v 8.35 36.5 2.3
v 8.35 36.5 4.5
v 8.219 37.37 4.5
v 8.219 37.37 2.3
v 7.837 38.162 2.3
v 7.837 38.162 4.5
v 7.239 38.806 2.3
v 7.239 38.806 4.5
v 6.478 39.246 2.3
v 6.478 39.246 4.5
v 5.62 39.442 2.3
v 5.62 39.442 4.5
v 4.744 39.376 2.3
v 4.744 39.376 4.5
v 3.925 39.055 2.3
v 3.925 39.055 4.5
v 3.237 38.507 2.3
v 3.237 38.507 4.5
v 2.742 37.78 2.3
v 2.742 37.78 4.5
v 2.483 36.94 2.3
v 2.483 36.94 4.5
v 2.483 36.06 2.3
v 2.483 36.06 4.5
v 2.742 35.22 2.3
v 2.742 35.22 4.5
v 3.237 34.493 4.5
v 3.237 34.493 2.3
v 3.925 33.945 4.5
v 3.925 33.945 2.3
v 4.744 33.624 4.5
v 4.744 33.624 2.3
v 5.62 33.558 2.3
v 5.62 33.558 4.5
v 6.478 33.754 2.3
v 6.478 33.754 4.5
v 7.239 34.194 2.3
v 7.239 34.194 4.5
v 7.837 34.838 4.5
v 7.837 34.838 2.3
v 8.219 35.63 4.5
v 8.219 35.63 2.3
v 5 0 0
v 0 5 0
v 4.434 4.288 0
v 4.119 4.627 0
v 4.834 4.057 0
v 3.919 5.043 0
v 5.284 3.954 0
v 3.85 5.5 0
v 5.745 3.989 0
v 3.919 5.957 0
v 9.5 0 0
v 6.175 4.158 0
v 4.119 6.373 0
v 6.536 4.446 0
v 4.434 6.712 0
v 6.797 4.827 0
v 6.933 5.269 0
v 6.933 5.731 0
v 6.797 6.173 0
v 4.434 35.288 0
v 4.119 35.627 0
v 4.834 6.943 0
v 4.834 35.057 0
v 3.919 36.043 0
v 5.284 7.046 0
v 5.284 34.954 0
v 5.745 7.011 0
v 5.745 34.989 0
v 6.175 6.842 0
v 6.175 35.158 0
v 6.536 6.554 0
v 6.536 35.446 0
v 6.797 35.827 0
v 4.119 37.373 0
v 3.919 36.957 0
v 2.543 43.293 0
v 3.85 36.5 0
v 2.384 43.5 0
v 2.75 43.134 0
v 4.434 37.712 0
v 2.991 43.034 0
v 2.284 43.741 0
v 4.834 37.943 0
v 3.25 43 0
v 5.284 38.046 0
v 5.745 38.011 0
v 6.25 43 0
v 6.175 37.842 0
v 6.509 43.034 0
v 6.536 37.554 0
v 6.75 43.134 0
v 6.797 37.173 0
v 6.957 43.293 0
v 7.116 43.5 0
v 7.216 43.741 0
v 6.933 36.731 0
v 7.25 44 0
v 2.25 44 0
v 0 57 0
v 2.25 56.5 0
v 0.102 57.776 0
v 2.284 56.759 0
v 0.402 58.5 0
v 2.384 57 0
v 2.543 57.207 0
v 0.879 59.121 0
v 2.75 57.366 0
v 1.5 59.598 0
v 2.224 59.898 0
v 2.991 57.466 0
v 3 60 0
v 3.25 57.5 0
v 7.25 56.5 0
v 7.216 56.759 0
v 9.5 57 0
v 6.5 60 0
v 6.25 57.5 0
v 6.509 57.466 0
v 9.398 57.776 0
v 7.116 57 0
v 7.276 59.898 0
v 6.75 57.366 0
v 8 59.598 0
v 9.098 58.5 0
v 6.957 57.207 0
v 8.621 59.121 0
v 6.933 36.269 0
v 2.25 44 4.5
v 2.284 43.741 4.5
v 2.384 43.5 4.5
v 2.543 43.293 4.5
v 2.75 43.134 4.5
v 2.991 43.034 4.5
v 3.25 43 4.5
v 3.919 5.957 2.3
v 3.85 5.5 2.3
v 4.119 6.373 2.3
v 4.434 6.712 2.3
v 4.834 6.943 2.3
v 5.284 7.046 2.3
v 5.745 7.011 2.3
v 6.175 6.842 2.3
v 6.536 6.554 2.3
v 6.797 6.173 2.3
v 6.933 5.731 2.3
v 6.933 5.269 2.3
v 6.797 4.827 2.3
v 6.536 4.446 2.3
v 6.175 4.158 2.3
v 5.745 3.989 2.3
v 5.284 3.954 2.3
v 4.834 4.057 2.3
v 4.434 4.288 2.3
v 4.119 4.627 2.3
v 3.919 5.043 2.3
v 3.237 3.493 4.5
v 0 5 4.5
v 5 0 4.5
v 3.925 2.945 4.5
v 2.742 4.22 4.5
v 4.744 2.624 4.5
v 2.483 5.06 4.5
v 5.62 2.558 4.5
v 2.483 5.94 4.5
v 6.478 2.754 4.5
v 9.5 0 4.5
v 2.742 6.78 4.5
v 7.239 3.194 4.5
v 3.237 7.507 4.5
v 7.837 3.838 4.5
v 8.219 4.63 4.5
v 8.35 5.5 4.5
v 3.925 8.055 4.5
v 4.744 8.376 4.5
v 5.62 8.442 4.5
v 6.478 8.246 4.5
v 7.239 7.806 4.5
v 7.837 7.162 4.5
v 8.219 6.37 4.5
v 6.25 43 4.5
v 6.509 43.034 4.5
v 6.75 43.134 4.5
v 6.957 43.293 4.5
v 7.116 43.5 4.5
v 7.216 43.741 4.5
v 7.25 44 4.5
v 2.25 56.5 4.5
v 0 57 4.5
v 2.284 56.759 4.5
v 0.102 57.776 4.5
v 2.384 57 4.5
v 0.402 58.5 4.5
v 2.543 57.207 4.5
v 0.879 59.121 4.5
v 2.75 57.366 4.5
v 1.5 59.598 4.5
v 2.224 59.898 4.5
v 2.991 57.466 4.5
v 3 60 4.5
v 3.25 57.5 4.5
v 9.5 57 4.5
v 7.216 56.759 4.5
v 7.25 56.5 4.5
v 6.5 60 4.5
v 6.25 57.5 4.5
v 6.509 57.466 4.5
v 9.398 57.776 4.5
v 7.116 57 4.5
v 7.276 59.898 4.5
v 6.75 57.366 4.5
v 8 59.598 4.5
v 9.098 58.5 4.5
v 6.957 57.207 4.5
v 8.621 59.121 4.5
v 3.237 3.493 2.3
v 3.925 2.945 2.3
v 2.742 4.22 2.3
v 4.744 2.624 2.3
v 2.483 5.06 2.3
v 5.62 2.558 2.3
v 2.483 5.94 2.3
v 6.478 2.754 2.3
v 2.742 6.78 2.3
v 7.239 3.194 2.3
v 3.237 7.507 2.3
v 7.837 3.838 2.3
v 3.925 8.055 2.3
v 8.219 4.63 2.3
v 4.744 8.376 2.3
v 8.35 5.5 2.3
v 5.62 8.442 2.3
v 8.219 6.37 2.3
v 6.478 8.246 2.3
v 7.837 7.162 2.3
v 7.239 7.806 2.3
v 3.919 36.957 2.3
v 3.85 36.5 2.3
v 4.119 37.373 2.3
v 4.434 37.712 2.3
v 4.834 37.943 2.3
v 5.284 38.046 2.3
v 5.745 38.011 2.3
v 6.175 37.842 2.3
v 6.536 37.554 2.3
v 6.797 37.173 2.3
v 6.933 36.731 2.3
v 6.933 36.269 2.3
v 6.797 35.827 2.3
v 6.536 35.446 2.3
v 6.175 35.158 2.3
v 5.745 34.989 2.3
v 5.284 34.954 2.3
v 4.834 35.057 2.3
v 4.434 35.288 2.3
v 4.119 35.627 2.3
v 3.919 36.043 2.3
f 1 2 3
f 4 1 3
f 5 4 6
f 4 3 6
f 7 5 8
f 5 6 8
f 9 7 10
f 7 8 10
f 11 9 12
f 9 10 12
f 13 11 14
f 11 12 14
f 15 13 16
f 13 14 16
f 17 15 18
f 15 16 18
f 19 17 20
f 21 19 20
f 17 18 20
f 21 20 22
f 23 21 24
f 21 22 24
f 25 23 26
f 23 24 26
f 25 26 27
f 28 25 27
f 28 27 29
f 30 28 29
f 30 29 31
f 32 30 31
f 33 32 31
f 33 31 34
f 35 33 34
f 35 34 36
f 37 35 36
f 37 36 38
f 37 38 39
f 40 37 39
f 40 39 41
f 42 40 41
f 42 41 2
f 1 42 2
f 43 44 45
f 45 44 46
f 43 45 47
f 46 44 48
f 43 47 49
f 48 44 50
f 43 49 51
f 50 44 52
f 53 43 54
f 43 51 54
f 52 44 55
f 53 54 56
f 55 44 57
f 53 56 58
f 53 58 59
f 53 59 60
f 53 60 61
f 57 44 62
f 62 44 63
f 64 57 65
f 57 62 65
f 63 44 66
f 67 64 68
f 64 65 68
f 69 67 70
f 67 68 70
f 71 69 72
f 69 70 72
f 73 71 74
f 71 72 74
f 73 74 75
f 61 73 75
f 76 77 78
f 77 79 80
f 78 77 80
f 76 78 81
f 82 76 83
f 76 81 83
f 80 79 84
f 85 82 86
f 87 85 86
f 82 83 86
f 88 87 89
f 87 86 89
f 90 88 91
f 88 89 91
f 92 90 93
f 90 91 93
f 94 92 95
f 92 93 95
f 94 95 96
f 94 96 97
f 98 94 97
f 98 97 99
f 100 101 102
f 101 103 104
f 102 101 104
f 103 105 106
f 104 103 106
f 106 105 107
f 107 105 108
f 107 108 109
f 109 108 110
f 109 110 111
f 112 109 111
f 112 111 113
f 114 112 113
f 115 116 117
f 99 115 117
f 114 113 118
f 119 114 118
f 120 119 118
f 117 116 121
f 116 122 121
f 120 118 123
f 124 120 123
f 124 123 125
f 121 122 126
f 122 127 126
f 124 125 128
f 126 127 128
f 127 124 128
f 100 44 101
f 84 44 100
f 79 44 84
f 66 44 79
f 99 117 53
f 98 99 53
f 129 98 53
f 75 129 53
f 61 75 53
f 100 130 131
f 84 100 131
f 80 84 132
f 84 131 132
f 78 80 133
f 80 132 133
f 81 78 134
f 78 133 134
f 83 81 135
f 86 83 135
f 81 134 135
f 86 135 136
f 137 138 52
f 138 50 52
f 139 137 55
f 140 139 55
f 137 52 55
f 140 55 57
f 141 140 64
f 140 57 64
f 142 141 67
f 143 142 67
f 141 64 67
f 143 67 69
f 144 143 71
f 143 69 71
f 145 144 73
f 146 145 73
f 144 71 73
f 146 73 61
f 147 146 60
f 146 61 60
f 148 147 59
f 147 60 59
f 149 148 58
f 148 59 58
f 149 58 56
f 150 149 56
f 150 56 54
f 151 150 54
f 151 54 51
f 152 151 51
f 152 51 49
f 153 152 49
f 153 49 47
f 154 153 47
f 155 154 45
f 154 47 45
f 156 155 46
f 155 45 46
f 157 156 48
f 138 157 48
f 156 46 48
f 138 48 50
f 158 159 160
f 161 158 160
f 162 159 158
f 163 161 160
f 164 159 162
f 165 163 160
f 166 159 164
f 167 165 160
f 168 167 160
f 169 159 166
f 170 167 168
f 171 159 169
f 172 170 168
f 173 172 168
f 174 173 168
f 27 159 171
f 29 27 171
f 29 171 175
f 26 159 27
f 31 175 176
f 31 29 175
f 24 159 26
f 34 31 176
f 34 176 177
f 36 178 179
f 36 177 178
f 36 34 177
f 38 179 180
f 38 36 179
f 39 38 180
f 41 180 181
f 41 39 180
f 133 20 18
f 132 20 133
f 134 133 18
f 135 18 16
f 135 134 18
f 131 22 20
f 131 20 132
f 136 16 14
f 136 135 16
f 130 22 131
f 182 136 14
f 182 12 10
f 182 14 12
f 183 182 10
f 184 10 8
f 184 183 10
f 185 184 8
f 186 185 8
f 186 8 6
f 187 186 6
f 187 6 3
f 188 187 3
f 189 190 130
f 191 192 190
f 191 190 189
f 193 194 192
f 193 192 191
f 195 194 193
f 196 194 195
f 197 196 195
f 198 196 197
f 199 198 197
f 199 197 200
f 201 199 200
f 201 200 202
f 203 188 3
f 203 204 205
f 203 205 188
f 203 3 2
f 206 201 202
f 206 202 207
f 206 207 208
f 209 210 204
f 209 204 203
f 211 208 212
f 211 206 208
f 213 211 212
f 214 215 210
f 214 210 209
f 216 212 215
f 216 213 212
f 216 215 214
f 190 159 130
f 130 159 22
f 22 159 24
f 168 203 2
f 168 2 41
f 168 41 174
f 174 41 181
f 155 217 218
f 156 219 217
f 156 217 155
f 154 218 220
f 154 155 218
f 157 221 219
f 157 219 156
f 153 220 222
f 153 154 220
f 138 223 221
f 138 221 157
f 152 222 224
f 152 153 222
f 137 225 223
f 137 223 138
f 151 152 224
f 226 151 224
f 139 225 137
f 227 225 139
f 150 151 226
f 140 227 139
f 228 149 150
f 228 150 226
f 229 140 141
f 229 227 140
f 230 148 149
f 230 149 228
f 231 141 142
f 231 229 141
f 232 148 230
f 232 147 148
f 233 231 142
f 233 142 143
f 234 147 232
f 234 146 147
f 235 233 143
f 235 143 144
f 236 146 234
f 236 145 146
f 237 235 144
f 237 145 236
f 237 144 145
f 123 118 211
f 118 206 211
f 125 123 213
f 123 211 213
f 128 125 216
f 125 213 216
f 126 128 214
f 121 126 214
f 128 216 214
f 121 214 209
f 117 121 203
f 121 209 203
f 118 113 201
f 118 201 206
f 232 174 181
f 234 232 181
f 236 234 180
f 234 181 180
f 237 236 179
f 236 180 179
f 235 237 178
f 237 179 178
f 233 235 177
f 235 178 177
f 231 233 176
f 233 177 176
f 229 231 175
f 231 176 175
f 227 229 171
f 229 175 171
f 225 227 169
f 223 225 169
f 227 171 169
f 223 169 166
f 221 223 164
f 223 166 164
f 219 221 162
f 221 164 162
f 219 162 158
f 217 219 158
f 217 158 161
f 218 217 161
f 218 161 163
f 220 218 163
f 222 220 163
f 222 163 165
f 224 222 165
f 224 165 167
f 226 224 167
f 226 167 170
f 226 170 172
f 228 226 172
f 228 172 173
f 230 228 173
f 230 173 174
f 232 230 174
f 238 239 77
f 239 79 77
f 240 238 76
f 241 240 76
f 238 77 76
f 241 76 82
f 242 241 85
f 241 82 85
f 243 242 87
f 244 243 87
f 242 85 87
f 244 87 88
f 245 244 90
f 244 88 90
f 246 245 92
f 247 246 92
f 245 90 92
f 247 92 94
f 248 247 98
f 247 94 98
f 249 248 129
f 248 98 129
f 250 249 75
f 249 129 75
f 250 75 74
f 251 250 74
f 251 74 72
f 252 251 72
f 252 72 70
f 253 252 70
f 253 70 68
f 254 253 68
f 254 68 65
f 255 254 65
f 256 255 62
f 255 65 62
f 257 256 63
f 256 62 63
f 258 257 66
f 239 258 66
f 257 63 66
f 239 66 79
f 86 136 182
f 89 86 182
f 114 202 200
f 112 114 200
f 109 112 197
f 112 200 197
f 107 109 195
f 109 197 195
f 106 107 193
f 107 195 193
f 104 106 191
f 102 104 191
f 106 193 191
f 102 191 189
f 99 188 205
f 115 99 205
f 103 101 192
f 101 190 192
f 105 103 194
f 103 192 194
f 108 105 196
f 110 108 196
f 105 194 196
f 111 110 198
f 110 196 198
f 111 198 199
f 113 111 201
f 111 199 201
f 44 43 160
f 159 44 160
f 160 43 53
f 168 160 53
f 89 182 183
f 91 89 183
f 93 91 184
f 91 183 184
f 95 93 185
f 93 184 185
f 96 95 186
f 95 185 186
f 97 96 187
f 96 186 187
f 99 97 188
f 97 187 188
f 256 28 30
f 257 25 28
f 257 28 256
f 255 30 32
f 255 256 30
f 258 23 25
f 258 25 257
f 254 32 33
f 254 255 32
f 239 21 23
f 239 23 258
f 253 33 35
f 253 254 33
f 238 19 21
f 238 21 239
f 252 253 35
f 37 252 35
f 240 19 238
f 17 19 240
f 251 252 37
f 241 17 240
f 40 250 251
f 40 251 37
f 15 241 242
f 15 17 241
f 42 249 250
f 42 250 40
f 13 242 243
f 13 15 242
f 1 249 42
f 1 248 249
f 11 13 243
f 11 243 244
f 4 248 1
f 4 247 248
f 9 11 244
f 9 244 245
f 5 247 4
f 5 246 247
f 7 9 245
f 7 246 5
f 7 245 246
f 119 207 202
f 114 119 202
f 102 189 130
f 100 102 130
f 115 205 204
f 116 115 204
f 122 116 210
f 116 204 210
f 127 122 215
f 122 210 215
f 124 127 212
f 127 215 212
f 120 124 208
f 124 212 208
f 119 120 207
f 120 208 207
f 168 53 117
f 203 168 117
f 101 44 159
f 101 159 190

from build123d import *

# Parameters (mm, degrees)
F0_W           = 9.5
F0_H           = 60
F1_DEPTH       = 4.5
F4_D           = 3.1
F4_CBORE_D     = 5.9
F4_CBORE_DEPTH = 2.2
F5_DEPTH       = 25
F6_SIZE        = 5
F7_R           = 3


with BuildPart() as f1:
    # F0 (on Top) → F1 (new body)
    with BuildSketch(Plane.XY):
        with Locations((4.75, 30)):
            Rectangle(F0_W, F0_H)
    extrude(amount=F1_DEPTH)

    # F4 (through all)
    with Locations(Plane.XY.offset(4.5)):
        with Locations((5.4, 36.5), (5.4, 5.5)):
            CounterBoreHole(F4_D / 2, F4_CBORE_D / 2, F4_CBORE_DEPTH)

    # F3 (on face) → F5 (cut)
    with BuildSketch(Plane.XY.offset(4.5)):
        with BuildLine():
            Line((6.25, 57.5), (3.25, 57.5))
            ThreePointArc((3.25, 57.5), (2.542893, 57.207107), (2.25, 56.5))
            Line((2.25, 56.5), (2.25, 44))
            ThreePointArc((2.25, 44), (2.542893, 43.292893), (3.25, 43))
            Line((3.25, 43), (6.25, 43))
            ThreePointArc((6.25, 43), (6.957107, 43.292893), (7.25, 44))
            Line((7.25, 44), (7.25, 56.5))
            ThreePointArc((7.25, 56.5), (6.957107, 57.207107), (6.25, 57.5))
        make_face()
    extrude(amount=-F5_DEPTH, mode=Mode.SUBTRACT)

    # F6
    f6_edges = [f1.edges().sort_by_distance(p)[0] for p in [
        (0, 0, 2.25),
    ]]
    chamfer(f6_edges, length=F6_SIZE)

    # F7
    f7_edges = [f1.edges().sort_by_distance(p)[0] for p in [
        (0, 60, 2.25),
        (9.5, 60, 2.25),
    ]]
    fillet(f7_edges, radius=F7_R)


solid = f1.part
